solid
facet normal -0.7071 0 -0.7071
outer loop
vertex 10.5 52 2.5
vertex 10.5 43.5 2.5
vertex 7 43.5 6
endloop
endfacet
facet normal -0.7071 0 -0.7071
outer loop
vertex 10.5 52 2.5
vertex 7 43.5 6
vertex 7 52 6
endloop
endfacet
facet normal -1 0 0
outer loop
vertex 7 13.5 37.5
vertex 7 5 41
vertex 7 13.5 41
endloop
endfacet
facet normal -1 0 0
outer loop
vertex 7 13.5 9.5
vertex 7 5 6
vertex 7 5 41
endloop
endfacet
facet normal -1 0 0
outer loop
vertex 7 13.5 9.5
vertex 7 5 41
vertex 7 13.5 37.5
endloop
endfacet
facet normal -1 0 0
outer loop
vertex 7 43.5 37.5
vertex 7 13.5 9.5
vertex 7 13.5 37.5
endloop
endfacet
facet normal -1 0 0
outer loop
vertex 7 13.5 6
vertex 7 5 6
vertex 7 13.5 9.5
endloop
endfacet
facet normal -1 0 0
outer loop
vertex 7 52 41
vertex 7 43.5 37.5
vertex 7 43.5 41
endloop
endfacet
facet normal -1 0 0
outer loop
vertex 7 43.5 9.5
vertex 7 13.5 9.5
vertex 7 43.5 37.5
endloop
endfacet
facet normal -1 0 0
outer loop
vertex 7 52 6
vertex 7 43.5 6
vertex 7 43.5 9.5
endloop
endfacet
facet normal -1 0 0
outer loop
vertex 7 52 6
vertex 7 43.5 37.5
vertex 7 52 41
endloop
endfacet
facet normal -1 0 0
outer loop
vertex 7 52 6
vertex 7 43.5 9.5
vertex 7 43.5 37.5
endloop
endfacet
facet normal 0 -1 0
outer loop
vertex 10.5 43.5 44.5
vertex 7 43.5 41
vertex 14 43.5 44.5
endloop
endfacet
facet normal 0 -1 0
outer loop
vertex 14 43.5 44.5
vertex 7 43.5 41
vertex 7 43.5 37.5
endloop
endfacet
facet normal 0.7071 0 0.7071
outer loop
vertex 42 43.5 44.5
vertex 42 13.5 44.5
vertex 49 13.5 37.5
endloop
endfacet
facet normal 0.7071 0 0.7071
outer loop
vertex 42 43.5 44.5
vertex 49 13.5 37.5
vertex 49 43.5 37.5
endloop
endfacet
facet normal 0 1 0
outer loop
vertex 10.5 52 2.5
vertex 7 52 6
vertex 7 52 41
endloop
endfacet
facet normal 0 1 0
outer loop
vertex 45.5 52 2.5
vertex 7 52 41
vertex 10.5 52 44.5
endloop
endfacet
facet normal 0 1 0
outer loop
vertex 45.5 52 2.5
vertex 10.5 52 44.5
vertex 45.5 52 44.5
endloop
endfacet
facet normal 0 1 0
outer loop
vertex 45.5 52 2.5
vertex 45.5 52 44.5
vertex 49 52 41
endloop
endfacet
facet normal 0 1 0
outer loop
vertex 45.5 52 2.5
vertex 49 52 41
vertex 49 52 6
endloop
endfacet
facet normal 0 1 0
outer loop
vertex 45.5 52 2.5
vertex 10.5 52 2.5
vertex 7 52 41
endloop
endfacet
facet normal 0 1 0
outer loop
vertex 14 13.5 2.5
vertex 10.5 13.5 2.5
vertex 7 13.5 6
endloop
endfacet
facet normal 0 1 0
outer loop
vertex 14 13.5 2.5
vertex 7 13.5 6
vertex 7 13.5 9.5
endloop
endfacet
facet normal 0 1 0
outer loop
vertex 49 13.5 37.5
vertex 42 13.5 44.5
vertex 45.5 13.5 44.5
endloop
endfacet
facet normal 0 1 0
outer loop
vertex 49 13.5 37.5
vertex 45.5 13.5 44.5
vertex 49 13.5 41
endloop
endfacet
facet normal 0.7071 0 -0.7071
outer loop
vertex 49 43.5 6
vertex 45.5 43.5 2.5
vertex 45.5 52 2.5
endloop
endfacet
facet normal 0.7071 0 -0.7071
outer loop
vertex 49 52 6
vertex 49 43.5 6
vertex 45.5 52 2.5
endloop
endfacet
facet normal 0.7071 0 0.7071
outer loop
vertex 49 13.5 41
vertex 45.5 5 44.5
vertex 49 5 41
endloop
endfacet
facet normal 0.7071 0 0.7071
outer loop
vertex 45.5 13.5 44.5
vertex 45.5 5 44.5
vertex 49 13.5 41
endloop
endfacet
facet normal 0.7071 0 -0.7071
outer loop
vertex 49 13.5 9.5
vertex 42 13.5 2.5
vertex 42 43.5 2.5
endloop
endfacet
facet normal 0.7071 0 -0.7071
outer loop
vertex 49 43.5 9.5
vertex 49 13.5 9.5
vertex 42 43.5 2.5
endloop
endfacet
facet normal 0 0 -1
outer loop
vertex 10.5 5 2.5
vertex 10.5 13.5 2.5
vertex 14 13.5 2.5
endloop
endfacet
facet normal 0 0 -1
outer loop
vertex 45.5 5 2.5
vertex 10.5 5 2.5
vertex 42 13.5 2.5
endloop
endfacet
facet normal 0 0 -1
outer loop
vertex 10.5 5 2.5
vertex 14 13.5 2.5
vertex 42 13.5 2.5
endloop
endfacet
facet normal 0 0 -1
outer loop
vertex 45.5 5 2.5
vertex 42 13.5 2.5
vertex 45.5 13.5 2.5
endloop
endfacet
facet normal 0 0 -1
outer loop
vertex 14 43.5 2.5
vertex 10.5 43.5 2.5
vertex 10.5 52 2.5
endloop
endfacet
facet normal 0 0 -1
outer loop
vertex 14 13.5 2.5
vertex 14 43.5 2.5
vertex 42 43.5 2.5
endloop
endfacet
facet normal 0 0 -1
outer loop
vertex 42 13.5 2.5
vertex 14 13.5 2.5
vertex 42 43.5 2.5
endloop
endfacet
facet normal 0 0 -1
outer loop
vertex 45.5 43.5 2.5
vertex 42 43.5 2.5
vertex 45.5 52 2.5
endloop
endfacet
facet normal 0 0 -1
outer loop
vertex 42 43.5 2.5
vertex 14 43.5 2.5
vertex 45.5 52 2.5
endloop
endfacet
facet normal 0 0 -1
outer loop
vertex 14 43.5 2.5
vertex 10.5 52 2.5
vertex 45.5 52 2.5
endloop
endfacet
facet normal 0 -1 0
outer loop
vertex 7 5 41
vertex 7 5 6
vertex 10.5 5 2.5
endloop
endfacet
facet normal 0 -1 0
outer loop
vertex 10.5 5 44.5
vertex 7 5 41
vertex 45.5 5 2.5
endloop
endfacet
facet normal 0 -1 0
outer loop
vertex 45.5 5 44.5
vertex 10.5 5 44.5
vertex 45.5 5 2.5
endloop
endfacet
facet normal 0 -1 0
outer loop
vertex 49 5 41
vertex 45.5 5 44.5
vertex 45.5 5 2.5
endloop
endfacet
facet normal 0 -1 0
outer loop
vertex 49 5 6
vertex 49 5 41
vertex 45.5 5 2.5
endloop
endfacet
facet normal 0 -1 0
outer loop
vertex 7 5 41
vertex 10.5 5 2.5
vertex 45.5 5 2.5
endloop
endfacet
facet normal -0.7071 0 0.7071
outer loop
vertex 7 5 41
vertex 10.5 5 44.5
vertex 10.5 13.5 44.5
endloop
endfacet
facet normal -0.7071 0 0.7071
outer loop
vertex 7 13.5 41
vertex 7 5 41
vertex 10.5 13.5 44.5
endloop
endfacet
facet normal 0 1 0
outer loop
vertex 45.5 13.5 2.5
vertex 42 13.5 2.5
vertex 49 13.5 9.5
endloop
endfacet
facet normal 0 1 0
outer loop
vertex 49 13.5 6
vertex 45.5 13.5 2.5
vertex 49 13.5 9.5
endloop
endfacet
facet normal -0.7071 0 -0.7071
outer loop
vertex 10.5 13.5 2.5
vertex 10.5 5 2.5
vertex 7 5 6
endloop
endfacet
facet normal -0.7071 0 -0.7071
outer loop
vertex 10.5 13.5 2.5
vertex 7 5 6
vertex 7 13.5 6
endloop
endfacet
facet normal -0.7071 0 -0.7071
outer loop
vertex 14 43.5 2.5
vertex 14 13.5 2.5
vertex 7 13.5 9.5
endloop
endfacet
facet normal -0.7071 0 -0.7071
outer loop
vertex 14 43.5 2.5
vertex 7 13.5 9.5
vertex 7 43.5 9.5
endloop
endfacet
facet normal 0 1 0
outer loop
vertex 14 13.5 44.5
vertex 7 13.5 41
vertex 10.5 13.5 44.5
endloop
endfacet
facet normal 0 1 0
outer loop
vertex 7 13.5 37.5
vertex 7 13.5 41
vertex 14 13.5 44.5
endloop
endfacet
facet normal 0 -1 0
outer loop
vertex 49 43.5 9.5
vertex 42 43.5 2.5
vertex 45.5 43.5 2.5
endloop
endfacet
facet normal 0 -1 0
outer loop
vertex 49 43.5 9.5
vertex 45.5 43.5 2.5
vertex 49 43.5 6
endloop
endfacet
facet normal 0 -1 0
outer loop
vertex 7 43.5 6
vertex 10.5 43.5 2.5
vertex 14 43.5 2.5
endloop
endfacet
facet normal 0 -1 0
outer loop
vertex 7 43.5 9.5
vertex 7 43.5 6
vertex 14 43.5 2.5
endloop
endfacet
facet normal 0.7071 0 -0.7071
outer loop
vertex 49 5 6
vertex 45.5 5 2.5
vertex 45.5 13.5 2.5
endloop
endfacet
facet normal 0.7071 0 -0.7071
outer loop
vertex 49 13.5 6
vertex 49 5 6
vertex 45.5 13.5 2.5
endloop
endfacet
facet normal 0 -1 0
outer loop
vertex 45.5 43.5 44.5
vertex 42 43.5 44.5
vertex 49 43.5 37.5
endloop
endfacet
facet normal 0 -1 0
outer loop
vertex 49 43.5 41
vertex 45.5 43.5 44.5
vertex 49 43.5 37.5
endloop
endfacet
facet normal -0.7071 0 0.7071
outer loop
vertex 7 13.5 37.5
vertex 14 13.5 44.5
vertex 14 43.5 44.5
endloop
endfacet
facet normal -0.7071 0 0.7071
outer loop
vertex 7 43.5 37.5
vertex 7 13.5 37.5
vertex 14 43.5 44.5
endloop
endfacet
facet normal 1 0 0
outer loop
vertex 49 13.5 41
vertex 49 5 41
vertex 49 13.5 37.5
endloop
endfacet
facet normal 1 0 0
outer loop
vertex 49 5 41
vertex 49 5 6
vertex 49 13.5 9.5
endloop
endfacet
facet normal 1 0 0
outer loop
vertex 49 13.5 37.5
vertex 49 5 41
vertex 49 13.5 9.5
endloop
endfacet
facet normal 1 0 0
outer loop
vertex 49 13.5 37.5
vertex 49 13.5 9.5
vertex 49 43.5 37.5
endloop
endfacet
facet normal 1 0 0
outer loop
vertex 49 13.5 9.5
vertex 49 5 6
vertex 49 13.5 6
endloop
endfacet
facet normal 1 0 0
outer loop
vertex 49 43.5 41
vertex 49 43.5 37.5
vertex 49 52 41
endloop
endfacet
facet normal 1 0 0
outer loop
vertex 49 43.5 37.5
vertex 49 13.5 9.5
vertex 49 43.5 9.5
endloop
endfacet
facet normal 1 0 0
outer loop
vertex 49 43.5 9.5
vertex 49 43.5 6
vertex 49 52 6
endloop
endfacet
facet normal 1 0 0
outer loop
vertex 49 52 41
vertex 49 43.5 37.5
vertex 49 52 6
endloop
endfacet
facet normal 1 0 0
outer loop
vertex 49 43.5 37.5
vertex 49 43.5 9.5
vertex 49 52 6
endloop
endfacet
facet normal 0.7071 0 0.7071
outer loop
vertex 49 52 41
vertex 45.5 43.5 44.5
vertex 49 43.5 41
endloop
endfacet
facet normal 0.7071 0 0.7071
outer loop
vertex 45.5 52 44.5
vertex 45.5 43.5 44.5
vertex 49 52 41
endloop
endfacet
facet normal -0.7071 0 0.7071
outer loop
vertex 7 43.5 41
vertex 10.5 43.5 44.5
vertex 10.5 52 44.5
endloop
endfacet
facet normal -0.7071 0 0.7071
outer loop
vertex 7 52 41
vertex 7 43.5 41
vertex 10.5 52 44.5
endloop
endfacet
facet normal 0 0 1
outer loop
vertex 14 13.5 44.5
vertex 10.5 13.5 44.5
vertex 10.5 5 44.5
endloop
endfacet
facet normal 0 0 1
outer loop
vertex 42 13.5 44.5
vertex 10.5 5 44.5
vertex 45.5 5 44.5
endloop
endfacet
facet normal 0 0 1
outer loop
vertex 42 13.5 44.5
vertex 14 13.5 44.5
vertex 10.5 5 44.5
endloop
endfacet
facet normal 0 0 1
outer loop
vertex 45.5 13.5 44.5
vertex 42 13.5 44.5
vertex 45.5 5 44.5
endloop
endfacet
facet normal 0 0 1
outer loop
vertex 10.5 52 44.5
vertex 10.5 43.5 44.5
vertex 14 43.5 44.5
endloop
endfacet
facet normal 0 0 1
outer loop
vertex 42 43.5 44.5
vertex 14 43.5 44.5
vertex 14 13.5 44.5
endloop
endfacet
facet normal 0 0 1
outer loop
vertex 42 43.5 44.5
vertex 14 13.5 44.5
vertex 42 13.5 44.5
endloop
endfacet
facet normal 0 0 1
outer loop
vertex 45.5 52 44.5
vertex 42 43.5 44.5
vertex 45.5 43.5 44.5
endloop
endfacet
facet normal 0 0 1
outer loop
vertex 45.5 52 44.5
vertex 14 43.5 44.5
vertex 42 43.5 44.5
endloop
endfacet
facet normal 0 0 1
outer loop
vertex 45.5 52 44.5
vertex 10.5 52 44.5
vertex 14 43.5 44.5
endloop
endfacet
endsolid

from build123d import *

# Parameters (mm, degrees)
BOX013_W        = 42
BOX013_H        = 8.5
BOX013_DEPTH    = 42
CHAMFER001_SIZE = 3.5
BOX_W           = 42
BOX_H           = 30
BOX_DEPTH       = 42
CHAMFER002_SIZE = 7
BOX012_W        = 42
BOX012_H        = 8.5
BOX012_DEPTH    = 42
CHAMFER_SIZE    = 3.5


with BuildPart() as chamfer001:
    # Box013 → Box013 (new body)
    with BuildSketch(Plane(origin=(7, 43.5, 2.5), x_dir=(1, 0, 0), z_dir=(0, 0, 1))):
        with Locations((21, 4.25)):
            Rectangle(BOX013_W, BOX013_H)
    extrude(amount=BOX013_DEPTH)

    # Chamfer001
    chamfer001_edges = [chamfer001.edges().sort_by_distance(p)[0] for p in [
        (7, 47.75, 44.5),
        (7, 47.75, 2.5),
        (49, 47.75, 44.5),
        (49, 47.75, 2.5),
    ]]
    chamfer(chamfer001_edges, length=CHAMFER001_SIZE)


with BuildPart() as chamfer002:
    # Box → Box (new body)
    with BuildSketch(Plane(origin=(7, 13.5, 2.5), x_dir=(1, 0, 0), z_dir=(0, 0, 1))):
        with Locations((21, 15)):
            Rectangle(BOX_W, BOX_H)
    extrude(amount=BOX_DEPTH)

    # Chamfer002
    chamfer002_edges = [chamfer002.edges().sort_by_distance(p)[0] for p in [
        (7, 28.5, 44.5),
        (7, 28.5, 2.5),
        (49, 28.5, 44.5),
        (49, 28.5, 2.5),
    ]]
    chamfer(chamfer002_edges, length=CHAMFER002_SIZE)


with BuildPart() as do_not_print_nema17_dummy:
    # Box012 → Box012 (new body)
    with BuildSketch(Plane(origin=(7, 5, 2.5), x_dir=(1, 0, 0), z_dir=(0, 0, 1))):
        with Locations((21, 4.25)):
            Rectangle(BOX012_W, BOX012_H)
    extrude(amount=BOX012_DEPTH)

    # Chamfer
    chamfer_edges = [do_not_print_nema17_dummy.edges().sort_by_distance(p)[0] for p in [
        (7, 9.25, 44.5),
        (7, 9.25, 2.5),
        (49, 9.25, 44.5),
        (49, 9.25, 2.5),
    ]]
    chamfer(chamfer_edges, length=CHAMFER_SIZE)

    # Fusion: union Chamfer001, Chamfer002
    add(chamfer001.part)
    add(chamfer002.part)


solid = do_not_print_nema17_dummy.part
